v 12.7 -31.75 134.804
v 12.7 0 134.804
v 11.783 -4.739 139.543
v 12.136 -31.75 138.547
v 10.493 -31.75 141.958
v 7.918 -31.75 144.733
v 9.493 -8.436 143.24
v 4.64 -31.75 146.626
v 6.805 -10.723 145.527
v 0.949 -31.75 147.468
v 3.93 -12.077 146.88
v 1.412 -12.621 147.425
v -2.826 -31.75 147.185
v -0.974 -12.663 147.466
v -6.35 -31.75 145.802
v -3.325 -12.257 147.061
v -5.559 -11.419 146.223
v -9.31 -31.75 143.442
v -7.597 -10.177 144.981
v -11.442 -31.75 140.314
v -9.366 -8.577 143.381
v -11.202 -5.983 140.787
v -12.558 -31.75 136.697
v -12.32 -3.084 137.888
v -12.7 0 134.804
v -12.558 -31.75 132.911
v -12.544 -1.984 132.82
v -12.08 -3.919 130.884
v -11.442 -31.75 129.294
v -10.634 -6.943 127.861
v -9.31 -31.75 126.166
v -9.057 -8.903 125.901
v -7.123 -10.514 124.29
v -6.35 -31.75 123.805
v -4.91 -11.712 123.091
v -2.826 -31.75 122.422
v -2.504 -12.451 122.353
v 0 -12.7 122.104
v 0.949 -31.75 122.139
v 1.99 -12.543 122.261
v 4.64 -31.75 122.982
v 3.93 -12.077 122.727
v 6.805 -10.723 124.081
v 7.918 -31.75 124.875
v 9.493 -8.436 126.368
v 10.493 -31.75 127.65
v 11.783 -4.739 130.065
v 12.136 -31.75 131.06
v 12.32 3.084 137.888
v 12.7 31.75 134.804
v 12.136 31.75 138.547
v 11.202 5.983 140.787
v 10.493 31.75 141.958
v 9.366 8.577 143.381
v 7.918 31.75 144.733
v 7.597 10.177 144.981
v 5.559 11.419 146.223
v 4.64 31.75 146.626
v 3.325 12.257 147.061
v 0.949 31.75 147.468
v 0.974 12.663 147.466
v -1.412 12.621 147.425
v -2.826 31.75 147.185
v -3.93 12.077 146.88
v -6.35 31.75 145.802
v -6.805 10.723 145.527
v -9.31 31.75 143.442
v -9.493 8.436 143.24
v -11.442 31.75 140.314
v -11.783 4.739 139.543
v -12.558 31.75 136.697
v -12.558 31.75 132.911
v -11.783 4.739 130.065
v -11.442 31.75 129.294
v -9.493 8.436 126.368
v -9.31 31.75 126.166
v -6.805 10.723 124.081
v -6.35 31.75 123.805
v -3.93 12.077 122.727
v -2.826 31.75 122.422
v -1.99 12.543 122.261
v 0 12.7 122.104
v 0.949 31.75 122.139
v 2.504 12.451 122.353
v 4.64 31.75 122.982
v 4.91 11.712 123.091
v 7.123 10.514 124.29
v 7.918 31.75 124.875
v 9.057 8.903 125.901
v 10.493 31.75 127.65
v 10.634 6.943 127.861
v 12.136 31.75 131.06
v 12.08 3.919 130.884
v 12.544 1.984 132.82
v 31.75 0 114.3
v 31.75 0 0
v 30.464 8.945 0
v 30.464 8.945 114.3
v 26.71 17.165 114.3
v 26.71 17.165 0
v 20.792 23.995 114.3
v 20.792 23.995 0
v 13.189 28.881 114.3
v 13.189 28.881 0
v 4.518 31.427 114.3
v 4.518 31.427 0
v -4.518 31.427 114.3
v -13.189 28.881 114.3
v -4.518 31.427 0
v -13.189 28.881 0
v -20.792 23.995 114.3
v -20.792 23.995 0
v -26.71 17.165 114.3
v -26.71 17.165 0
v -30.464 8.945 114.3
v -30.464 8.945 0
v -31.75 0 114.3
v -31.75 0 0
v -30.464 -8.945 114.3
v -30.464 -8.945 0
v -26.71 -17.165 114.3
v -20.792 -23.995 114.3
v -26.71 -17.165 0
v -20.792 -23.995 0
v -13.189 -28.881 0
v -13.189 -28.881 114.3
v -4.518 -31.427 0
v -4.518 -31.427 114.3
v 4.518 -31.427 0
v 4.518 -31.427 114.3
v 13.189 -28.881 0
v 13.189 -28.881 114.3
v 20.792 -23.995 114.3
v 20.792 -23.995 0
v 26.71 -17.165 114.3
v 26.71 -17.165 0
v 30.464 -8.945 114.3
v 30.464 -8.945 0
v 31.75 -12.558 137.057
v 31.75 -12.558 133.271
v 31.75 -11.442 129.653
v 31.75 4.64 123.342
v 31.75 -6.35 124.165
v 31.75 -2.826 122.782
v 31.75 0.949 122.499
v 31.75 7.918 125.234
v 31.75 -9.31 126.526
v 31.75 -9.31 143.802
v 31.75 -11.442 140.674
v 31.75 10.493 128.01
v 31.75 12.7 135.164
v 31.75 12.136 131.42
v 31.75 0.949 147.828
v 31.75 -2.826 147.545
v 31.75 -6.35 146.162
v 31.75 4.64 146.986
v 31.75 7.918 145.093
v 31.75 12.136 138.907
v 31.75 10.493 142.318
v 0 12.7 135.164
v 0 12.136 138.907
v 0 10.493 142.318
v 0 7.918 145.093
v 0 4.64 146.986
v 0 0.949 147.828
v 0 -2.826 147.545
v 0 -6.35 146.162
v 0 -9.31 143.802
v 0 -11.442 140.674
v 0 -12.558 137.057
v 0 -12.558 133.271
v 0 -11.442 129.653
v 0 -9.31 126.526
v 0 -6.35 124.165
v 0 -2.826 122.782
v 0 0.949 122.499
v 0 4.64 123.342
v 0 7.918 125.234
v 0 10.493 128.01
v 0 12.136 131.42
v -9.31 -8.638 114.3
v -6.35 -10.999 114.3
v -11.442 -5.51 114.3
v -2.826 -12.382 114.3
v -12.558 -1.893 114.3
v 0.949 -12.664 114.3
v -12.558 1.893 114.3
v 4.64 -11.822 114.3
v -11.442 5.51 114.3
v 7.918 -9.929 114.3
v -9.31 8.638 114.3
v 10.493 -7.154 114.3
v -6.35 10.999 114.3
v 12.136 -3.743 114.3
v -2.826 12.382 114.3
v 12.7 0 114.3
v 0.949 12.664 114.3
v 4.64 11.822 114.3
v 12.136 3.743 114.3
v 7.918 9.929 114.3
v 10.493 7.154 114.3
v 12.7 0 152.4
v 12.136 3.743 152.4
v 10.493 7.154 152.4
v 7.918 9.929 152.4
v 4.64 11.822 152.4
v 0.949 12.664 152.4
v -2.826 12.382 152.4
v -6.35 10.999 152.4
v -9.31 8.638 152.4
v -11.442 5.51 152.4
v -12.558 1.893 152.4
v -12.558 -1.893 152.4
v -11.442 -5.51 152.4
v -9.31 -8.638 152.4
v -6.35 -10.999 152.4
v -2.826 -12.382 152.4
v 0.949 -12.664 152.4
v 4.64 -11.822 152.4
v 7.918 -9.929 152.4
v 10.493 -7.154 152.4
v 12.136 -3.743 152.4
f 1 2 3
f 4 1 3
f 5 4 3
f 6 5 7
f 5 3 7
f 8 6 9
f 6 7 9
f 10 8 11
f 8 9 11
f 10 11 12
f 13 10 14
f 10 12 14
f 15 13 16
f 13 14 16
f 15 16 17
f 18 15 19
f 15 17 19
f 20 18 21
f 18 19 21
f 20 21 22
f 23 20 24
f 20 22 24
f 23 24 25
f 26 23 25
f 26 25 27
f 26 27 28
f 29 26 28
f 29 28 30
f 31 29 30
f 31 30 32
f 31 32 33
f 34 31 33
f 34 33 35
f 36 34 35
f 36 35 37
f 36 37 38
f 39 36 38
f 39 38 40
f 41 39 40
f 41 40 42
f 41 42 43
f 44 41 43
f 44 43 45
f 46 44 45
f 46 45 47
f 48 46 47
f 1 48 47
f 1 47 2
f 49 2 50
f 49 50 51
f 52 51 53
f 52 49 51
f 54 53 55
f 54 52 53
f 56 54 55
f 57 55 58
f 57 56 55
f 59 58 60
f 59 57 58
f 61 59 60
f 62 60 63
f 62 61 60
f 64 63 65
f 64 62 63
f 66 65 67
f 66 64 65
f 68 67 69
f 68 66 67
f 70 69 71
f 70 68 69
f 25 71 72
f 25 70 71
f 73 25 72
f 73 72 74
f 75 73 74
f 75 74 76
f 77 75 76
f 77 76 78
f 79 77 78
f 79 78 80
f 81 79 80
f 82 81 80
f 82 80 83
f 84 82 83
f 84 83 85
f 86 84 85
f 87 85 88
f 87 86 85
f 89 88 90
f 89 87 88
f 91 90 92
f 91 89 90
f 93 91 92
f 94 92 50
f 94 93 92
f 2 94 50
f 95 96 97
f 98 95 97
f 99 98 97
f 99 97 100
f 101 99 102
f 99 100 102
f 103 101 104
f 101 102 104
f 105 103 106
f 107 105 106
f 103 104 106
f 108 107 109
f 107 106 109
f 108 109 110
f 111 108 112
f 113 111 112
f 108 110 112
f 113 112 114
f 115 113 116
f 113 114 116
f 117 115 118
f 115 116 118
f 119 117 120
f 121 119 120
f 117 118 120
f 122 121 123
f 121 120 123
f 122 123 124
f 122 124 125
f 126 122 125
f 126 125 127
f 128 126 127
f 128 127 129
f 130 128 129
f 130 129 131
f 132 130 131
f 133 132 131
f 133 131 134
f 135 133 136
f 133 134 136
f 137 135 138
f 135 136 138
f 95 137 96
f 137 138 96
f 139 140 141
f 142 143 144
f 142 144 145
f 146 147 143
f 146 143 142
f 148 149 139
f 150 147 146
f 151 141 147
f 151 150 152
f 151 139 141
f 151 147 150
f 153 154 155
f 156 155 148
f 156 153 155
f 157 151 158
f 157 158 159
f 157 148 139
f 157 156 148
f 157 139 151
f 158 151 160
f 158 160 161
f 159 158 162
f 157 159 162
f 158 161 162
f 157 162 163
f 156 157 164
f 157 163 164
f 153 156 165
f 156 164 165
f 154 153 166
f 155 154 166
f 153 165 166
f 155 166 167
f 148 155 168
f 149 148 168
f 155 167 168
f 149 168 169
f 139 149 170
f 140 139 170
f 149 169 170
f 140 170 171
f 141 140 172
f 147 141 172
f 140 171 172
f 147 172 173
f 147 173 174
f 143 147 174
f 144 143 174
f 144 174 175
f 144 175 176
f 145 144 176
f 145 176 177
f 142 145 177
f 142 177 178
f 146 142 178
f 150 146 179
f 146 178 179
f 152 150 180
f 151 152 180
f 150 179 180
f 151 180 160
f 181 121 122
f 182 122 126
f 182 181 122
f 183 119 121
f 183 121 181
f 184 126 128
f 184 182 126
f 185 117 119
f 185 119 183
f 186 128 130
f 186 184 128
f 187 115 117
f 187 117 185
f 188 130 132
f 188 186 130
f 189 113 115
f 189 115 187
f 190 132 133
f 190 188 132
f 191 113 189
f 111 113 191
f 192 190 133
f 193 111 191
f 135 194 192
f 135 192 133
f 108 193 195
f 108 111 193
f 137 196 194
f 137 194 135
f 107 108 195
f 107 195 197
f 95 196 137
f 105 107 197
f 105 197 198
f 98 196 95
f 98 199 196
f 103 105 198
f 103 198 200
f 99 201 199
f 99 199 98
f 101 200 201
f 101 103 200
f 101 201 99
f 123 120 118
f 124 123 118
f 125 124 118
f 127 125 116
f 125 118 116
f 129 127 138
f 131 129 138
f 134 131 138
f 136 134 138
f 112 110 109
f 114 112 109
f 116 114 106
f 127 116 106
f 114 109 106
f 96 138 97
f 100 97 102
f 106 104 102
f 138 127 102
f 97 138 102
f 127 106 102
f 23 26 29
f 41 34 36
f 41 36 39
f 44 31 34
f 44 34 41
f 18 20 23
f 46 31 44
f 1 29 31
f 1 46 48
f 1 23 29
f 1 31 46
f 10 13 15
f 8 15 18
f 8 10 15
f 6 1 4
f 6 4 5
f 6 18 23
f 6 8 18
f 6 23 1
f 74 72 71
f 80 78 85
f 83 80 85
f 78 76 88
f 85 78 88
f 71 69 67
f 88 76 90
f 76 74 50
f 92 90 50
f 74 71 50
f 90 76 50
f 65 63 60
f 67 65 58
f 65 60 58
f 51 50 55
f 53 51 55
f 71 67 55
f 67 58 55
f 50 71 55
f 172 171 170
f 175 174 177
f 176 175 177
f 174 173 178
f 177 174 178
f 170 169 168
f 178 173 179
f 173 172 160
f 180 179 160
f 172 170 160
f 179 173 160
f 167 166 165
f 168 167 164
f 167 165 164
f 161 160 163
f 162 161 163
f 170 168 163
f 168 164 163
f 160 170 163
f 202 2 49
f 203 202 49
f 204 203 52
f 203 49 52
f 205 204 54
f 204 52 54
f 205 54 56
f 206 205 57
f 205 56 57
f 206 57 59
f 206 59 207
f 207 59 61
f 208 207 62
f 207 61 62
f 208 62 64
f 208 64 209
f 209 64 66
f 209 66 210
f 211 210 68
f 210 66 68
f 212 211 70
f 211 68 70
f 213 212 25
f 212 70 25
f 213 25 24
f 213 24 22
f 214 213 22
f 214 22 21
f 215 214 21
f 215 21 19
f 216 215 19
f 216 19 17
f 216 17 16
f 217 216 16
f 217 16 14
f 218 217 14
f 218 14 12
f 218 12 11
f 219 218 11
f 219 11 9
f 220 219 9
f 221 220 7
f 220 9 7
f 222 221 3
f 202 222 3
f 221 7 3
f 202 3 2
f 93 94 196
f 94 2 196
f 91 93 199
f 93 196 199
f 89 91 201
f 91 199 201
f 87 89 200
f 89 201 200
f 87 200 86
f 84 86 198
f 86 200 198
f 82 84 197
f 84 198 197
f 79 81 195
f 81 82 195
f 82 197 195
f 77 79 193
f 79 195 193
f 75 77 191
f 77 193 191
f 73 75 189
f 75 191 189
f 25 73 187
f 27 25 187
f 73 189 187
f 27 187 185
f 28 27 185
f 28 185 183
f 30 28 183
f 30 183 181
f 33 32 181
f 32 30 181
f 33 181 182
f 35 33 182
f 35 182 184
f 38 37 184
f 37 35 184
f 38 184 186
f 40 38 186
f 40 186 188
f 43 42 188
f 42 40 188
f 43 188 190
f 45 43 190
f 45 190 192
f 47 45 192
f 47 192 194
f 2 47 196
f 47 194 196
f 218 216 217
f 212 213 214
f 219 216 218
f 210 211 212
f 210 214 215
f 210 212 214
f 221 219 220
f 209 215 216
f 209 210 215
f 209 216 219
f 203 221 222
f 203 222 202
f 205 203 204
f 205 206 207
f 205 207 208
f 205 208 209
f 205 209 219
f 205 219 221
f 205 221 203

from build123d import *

# Parameters (mm, degrees)
F0_R     = 31.75
F1_DEPTH = 114.3
F2_R     = 12.7
F3_DEPTH = 38.1
F4_R     = 12.7
F5_DEPTH = 31.75
F6_R     = 12.7
F7_DEPTH = 31.75


# Not quite as in the source:
# - a pattern or mirror of a feature is missing from the dataset's text; its kind, count and spacing are read off the source's solid


with BuildPart() as f1:
    # F0 (on Top) → F1 (new body)
    with BuildSketch(Plane.XY):
        Circle(F0_R)
    extrude(amount=F1_DEPTH)

    # F2 (on face) → F3 (join)
    with BuildSketch(Plane.XY.offset(114.3)):
        Circle(F2_R)
    extrude(amount=F3_DEPTH)

    # F4 (on Front) → F5 (join)
    with BuildSketch(Plane.XZ):
        with Locations((0, 134.8038613796)):
            Circle(F4_R)
    f5 = extrude(amount=F5_DEPTH)

    # F5_copies: F5 across plane
    add(f5.mirror(Plane.ZX))


with BuildPart() as f7:
    # F6 (on Right) → F7 (new body)
    with BuildSketch(Plane.YZ):
        with Locations((0, 135.1637542248)):
            Circle(F6_R)
    extrude(amount=F7_DEPTH)


solid = Compound([f1.part, f7.part])
